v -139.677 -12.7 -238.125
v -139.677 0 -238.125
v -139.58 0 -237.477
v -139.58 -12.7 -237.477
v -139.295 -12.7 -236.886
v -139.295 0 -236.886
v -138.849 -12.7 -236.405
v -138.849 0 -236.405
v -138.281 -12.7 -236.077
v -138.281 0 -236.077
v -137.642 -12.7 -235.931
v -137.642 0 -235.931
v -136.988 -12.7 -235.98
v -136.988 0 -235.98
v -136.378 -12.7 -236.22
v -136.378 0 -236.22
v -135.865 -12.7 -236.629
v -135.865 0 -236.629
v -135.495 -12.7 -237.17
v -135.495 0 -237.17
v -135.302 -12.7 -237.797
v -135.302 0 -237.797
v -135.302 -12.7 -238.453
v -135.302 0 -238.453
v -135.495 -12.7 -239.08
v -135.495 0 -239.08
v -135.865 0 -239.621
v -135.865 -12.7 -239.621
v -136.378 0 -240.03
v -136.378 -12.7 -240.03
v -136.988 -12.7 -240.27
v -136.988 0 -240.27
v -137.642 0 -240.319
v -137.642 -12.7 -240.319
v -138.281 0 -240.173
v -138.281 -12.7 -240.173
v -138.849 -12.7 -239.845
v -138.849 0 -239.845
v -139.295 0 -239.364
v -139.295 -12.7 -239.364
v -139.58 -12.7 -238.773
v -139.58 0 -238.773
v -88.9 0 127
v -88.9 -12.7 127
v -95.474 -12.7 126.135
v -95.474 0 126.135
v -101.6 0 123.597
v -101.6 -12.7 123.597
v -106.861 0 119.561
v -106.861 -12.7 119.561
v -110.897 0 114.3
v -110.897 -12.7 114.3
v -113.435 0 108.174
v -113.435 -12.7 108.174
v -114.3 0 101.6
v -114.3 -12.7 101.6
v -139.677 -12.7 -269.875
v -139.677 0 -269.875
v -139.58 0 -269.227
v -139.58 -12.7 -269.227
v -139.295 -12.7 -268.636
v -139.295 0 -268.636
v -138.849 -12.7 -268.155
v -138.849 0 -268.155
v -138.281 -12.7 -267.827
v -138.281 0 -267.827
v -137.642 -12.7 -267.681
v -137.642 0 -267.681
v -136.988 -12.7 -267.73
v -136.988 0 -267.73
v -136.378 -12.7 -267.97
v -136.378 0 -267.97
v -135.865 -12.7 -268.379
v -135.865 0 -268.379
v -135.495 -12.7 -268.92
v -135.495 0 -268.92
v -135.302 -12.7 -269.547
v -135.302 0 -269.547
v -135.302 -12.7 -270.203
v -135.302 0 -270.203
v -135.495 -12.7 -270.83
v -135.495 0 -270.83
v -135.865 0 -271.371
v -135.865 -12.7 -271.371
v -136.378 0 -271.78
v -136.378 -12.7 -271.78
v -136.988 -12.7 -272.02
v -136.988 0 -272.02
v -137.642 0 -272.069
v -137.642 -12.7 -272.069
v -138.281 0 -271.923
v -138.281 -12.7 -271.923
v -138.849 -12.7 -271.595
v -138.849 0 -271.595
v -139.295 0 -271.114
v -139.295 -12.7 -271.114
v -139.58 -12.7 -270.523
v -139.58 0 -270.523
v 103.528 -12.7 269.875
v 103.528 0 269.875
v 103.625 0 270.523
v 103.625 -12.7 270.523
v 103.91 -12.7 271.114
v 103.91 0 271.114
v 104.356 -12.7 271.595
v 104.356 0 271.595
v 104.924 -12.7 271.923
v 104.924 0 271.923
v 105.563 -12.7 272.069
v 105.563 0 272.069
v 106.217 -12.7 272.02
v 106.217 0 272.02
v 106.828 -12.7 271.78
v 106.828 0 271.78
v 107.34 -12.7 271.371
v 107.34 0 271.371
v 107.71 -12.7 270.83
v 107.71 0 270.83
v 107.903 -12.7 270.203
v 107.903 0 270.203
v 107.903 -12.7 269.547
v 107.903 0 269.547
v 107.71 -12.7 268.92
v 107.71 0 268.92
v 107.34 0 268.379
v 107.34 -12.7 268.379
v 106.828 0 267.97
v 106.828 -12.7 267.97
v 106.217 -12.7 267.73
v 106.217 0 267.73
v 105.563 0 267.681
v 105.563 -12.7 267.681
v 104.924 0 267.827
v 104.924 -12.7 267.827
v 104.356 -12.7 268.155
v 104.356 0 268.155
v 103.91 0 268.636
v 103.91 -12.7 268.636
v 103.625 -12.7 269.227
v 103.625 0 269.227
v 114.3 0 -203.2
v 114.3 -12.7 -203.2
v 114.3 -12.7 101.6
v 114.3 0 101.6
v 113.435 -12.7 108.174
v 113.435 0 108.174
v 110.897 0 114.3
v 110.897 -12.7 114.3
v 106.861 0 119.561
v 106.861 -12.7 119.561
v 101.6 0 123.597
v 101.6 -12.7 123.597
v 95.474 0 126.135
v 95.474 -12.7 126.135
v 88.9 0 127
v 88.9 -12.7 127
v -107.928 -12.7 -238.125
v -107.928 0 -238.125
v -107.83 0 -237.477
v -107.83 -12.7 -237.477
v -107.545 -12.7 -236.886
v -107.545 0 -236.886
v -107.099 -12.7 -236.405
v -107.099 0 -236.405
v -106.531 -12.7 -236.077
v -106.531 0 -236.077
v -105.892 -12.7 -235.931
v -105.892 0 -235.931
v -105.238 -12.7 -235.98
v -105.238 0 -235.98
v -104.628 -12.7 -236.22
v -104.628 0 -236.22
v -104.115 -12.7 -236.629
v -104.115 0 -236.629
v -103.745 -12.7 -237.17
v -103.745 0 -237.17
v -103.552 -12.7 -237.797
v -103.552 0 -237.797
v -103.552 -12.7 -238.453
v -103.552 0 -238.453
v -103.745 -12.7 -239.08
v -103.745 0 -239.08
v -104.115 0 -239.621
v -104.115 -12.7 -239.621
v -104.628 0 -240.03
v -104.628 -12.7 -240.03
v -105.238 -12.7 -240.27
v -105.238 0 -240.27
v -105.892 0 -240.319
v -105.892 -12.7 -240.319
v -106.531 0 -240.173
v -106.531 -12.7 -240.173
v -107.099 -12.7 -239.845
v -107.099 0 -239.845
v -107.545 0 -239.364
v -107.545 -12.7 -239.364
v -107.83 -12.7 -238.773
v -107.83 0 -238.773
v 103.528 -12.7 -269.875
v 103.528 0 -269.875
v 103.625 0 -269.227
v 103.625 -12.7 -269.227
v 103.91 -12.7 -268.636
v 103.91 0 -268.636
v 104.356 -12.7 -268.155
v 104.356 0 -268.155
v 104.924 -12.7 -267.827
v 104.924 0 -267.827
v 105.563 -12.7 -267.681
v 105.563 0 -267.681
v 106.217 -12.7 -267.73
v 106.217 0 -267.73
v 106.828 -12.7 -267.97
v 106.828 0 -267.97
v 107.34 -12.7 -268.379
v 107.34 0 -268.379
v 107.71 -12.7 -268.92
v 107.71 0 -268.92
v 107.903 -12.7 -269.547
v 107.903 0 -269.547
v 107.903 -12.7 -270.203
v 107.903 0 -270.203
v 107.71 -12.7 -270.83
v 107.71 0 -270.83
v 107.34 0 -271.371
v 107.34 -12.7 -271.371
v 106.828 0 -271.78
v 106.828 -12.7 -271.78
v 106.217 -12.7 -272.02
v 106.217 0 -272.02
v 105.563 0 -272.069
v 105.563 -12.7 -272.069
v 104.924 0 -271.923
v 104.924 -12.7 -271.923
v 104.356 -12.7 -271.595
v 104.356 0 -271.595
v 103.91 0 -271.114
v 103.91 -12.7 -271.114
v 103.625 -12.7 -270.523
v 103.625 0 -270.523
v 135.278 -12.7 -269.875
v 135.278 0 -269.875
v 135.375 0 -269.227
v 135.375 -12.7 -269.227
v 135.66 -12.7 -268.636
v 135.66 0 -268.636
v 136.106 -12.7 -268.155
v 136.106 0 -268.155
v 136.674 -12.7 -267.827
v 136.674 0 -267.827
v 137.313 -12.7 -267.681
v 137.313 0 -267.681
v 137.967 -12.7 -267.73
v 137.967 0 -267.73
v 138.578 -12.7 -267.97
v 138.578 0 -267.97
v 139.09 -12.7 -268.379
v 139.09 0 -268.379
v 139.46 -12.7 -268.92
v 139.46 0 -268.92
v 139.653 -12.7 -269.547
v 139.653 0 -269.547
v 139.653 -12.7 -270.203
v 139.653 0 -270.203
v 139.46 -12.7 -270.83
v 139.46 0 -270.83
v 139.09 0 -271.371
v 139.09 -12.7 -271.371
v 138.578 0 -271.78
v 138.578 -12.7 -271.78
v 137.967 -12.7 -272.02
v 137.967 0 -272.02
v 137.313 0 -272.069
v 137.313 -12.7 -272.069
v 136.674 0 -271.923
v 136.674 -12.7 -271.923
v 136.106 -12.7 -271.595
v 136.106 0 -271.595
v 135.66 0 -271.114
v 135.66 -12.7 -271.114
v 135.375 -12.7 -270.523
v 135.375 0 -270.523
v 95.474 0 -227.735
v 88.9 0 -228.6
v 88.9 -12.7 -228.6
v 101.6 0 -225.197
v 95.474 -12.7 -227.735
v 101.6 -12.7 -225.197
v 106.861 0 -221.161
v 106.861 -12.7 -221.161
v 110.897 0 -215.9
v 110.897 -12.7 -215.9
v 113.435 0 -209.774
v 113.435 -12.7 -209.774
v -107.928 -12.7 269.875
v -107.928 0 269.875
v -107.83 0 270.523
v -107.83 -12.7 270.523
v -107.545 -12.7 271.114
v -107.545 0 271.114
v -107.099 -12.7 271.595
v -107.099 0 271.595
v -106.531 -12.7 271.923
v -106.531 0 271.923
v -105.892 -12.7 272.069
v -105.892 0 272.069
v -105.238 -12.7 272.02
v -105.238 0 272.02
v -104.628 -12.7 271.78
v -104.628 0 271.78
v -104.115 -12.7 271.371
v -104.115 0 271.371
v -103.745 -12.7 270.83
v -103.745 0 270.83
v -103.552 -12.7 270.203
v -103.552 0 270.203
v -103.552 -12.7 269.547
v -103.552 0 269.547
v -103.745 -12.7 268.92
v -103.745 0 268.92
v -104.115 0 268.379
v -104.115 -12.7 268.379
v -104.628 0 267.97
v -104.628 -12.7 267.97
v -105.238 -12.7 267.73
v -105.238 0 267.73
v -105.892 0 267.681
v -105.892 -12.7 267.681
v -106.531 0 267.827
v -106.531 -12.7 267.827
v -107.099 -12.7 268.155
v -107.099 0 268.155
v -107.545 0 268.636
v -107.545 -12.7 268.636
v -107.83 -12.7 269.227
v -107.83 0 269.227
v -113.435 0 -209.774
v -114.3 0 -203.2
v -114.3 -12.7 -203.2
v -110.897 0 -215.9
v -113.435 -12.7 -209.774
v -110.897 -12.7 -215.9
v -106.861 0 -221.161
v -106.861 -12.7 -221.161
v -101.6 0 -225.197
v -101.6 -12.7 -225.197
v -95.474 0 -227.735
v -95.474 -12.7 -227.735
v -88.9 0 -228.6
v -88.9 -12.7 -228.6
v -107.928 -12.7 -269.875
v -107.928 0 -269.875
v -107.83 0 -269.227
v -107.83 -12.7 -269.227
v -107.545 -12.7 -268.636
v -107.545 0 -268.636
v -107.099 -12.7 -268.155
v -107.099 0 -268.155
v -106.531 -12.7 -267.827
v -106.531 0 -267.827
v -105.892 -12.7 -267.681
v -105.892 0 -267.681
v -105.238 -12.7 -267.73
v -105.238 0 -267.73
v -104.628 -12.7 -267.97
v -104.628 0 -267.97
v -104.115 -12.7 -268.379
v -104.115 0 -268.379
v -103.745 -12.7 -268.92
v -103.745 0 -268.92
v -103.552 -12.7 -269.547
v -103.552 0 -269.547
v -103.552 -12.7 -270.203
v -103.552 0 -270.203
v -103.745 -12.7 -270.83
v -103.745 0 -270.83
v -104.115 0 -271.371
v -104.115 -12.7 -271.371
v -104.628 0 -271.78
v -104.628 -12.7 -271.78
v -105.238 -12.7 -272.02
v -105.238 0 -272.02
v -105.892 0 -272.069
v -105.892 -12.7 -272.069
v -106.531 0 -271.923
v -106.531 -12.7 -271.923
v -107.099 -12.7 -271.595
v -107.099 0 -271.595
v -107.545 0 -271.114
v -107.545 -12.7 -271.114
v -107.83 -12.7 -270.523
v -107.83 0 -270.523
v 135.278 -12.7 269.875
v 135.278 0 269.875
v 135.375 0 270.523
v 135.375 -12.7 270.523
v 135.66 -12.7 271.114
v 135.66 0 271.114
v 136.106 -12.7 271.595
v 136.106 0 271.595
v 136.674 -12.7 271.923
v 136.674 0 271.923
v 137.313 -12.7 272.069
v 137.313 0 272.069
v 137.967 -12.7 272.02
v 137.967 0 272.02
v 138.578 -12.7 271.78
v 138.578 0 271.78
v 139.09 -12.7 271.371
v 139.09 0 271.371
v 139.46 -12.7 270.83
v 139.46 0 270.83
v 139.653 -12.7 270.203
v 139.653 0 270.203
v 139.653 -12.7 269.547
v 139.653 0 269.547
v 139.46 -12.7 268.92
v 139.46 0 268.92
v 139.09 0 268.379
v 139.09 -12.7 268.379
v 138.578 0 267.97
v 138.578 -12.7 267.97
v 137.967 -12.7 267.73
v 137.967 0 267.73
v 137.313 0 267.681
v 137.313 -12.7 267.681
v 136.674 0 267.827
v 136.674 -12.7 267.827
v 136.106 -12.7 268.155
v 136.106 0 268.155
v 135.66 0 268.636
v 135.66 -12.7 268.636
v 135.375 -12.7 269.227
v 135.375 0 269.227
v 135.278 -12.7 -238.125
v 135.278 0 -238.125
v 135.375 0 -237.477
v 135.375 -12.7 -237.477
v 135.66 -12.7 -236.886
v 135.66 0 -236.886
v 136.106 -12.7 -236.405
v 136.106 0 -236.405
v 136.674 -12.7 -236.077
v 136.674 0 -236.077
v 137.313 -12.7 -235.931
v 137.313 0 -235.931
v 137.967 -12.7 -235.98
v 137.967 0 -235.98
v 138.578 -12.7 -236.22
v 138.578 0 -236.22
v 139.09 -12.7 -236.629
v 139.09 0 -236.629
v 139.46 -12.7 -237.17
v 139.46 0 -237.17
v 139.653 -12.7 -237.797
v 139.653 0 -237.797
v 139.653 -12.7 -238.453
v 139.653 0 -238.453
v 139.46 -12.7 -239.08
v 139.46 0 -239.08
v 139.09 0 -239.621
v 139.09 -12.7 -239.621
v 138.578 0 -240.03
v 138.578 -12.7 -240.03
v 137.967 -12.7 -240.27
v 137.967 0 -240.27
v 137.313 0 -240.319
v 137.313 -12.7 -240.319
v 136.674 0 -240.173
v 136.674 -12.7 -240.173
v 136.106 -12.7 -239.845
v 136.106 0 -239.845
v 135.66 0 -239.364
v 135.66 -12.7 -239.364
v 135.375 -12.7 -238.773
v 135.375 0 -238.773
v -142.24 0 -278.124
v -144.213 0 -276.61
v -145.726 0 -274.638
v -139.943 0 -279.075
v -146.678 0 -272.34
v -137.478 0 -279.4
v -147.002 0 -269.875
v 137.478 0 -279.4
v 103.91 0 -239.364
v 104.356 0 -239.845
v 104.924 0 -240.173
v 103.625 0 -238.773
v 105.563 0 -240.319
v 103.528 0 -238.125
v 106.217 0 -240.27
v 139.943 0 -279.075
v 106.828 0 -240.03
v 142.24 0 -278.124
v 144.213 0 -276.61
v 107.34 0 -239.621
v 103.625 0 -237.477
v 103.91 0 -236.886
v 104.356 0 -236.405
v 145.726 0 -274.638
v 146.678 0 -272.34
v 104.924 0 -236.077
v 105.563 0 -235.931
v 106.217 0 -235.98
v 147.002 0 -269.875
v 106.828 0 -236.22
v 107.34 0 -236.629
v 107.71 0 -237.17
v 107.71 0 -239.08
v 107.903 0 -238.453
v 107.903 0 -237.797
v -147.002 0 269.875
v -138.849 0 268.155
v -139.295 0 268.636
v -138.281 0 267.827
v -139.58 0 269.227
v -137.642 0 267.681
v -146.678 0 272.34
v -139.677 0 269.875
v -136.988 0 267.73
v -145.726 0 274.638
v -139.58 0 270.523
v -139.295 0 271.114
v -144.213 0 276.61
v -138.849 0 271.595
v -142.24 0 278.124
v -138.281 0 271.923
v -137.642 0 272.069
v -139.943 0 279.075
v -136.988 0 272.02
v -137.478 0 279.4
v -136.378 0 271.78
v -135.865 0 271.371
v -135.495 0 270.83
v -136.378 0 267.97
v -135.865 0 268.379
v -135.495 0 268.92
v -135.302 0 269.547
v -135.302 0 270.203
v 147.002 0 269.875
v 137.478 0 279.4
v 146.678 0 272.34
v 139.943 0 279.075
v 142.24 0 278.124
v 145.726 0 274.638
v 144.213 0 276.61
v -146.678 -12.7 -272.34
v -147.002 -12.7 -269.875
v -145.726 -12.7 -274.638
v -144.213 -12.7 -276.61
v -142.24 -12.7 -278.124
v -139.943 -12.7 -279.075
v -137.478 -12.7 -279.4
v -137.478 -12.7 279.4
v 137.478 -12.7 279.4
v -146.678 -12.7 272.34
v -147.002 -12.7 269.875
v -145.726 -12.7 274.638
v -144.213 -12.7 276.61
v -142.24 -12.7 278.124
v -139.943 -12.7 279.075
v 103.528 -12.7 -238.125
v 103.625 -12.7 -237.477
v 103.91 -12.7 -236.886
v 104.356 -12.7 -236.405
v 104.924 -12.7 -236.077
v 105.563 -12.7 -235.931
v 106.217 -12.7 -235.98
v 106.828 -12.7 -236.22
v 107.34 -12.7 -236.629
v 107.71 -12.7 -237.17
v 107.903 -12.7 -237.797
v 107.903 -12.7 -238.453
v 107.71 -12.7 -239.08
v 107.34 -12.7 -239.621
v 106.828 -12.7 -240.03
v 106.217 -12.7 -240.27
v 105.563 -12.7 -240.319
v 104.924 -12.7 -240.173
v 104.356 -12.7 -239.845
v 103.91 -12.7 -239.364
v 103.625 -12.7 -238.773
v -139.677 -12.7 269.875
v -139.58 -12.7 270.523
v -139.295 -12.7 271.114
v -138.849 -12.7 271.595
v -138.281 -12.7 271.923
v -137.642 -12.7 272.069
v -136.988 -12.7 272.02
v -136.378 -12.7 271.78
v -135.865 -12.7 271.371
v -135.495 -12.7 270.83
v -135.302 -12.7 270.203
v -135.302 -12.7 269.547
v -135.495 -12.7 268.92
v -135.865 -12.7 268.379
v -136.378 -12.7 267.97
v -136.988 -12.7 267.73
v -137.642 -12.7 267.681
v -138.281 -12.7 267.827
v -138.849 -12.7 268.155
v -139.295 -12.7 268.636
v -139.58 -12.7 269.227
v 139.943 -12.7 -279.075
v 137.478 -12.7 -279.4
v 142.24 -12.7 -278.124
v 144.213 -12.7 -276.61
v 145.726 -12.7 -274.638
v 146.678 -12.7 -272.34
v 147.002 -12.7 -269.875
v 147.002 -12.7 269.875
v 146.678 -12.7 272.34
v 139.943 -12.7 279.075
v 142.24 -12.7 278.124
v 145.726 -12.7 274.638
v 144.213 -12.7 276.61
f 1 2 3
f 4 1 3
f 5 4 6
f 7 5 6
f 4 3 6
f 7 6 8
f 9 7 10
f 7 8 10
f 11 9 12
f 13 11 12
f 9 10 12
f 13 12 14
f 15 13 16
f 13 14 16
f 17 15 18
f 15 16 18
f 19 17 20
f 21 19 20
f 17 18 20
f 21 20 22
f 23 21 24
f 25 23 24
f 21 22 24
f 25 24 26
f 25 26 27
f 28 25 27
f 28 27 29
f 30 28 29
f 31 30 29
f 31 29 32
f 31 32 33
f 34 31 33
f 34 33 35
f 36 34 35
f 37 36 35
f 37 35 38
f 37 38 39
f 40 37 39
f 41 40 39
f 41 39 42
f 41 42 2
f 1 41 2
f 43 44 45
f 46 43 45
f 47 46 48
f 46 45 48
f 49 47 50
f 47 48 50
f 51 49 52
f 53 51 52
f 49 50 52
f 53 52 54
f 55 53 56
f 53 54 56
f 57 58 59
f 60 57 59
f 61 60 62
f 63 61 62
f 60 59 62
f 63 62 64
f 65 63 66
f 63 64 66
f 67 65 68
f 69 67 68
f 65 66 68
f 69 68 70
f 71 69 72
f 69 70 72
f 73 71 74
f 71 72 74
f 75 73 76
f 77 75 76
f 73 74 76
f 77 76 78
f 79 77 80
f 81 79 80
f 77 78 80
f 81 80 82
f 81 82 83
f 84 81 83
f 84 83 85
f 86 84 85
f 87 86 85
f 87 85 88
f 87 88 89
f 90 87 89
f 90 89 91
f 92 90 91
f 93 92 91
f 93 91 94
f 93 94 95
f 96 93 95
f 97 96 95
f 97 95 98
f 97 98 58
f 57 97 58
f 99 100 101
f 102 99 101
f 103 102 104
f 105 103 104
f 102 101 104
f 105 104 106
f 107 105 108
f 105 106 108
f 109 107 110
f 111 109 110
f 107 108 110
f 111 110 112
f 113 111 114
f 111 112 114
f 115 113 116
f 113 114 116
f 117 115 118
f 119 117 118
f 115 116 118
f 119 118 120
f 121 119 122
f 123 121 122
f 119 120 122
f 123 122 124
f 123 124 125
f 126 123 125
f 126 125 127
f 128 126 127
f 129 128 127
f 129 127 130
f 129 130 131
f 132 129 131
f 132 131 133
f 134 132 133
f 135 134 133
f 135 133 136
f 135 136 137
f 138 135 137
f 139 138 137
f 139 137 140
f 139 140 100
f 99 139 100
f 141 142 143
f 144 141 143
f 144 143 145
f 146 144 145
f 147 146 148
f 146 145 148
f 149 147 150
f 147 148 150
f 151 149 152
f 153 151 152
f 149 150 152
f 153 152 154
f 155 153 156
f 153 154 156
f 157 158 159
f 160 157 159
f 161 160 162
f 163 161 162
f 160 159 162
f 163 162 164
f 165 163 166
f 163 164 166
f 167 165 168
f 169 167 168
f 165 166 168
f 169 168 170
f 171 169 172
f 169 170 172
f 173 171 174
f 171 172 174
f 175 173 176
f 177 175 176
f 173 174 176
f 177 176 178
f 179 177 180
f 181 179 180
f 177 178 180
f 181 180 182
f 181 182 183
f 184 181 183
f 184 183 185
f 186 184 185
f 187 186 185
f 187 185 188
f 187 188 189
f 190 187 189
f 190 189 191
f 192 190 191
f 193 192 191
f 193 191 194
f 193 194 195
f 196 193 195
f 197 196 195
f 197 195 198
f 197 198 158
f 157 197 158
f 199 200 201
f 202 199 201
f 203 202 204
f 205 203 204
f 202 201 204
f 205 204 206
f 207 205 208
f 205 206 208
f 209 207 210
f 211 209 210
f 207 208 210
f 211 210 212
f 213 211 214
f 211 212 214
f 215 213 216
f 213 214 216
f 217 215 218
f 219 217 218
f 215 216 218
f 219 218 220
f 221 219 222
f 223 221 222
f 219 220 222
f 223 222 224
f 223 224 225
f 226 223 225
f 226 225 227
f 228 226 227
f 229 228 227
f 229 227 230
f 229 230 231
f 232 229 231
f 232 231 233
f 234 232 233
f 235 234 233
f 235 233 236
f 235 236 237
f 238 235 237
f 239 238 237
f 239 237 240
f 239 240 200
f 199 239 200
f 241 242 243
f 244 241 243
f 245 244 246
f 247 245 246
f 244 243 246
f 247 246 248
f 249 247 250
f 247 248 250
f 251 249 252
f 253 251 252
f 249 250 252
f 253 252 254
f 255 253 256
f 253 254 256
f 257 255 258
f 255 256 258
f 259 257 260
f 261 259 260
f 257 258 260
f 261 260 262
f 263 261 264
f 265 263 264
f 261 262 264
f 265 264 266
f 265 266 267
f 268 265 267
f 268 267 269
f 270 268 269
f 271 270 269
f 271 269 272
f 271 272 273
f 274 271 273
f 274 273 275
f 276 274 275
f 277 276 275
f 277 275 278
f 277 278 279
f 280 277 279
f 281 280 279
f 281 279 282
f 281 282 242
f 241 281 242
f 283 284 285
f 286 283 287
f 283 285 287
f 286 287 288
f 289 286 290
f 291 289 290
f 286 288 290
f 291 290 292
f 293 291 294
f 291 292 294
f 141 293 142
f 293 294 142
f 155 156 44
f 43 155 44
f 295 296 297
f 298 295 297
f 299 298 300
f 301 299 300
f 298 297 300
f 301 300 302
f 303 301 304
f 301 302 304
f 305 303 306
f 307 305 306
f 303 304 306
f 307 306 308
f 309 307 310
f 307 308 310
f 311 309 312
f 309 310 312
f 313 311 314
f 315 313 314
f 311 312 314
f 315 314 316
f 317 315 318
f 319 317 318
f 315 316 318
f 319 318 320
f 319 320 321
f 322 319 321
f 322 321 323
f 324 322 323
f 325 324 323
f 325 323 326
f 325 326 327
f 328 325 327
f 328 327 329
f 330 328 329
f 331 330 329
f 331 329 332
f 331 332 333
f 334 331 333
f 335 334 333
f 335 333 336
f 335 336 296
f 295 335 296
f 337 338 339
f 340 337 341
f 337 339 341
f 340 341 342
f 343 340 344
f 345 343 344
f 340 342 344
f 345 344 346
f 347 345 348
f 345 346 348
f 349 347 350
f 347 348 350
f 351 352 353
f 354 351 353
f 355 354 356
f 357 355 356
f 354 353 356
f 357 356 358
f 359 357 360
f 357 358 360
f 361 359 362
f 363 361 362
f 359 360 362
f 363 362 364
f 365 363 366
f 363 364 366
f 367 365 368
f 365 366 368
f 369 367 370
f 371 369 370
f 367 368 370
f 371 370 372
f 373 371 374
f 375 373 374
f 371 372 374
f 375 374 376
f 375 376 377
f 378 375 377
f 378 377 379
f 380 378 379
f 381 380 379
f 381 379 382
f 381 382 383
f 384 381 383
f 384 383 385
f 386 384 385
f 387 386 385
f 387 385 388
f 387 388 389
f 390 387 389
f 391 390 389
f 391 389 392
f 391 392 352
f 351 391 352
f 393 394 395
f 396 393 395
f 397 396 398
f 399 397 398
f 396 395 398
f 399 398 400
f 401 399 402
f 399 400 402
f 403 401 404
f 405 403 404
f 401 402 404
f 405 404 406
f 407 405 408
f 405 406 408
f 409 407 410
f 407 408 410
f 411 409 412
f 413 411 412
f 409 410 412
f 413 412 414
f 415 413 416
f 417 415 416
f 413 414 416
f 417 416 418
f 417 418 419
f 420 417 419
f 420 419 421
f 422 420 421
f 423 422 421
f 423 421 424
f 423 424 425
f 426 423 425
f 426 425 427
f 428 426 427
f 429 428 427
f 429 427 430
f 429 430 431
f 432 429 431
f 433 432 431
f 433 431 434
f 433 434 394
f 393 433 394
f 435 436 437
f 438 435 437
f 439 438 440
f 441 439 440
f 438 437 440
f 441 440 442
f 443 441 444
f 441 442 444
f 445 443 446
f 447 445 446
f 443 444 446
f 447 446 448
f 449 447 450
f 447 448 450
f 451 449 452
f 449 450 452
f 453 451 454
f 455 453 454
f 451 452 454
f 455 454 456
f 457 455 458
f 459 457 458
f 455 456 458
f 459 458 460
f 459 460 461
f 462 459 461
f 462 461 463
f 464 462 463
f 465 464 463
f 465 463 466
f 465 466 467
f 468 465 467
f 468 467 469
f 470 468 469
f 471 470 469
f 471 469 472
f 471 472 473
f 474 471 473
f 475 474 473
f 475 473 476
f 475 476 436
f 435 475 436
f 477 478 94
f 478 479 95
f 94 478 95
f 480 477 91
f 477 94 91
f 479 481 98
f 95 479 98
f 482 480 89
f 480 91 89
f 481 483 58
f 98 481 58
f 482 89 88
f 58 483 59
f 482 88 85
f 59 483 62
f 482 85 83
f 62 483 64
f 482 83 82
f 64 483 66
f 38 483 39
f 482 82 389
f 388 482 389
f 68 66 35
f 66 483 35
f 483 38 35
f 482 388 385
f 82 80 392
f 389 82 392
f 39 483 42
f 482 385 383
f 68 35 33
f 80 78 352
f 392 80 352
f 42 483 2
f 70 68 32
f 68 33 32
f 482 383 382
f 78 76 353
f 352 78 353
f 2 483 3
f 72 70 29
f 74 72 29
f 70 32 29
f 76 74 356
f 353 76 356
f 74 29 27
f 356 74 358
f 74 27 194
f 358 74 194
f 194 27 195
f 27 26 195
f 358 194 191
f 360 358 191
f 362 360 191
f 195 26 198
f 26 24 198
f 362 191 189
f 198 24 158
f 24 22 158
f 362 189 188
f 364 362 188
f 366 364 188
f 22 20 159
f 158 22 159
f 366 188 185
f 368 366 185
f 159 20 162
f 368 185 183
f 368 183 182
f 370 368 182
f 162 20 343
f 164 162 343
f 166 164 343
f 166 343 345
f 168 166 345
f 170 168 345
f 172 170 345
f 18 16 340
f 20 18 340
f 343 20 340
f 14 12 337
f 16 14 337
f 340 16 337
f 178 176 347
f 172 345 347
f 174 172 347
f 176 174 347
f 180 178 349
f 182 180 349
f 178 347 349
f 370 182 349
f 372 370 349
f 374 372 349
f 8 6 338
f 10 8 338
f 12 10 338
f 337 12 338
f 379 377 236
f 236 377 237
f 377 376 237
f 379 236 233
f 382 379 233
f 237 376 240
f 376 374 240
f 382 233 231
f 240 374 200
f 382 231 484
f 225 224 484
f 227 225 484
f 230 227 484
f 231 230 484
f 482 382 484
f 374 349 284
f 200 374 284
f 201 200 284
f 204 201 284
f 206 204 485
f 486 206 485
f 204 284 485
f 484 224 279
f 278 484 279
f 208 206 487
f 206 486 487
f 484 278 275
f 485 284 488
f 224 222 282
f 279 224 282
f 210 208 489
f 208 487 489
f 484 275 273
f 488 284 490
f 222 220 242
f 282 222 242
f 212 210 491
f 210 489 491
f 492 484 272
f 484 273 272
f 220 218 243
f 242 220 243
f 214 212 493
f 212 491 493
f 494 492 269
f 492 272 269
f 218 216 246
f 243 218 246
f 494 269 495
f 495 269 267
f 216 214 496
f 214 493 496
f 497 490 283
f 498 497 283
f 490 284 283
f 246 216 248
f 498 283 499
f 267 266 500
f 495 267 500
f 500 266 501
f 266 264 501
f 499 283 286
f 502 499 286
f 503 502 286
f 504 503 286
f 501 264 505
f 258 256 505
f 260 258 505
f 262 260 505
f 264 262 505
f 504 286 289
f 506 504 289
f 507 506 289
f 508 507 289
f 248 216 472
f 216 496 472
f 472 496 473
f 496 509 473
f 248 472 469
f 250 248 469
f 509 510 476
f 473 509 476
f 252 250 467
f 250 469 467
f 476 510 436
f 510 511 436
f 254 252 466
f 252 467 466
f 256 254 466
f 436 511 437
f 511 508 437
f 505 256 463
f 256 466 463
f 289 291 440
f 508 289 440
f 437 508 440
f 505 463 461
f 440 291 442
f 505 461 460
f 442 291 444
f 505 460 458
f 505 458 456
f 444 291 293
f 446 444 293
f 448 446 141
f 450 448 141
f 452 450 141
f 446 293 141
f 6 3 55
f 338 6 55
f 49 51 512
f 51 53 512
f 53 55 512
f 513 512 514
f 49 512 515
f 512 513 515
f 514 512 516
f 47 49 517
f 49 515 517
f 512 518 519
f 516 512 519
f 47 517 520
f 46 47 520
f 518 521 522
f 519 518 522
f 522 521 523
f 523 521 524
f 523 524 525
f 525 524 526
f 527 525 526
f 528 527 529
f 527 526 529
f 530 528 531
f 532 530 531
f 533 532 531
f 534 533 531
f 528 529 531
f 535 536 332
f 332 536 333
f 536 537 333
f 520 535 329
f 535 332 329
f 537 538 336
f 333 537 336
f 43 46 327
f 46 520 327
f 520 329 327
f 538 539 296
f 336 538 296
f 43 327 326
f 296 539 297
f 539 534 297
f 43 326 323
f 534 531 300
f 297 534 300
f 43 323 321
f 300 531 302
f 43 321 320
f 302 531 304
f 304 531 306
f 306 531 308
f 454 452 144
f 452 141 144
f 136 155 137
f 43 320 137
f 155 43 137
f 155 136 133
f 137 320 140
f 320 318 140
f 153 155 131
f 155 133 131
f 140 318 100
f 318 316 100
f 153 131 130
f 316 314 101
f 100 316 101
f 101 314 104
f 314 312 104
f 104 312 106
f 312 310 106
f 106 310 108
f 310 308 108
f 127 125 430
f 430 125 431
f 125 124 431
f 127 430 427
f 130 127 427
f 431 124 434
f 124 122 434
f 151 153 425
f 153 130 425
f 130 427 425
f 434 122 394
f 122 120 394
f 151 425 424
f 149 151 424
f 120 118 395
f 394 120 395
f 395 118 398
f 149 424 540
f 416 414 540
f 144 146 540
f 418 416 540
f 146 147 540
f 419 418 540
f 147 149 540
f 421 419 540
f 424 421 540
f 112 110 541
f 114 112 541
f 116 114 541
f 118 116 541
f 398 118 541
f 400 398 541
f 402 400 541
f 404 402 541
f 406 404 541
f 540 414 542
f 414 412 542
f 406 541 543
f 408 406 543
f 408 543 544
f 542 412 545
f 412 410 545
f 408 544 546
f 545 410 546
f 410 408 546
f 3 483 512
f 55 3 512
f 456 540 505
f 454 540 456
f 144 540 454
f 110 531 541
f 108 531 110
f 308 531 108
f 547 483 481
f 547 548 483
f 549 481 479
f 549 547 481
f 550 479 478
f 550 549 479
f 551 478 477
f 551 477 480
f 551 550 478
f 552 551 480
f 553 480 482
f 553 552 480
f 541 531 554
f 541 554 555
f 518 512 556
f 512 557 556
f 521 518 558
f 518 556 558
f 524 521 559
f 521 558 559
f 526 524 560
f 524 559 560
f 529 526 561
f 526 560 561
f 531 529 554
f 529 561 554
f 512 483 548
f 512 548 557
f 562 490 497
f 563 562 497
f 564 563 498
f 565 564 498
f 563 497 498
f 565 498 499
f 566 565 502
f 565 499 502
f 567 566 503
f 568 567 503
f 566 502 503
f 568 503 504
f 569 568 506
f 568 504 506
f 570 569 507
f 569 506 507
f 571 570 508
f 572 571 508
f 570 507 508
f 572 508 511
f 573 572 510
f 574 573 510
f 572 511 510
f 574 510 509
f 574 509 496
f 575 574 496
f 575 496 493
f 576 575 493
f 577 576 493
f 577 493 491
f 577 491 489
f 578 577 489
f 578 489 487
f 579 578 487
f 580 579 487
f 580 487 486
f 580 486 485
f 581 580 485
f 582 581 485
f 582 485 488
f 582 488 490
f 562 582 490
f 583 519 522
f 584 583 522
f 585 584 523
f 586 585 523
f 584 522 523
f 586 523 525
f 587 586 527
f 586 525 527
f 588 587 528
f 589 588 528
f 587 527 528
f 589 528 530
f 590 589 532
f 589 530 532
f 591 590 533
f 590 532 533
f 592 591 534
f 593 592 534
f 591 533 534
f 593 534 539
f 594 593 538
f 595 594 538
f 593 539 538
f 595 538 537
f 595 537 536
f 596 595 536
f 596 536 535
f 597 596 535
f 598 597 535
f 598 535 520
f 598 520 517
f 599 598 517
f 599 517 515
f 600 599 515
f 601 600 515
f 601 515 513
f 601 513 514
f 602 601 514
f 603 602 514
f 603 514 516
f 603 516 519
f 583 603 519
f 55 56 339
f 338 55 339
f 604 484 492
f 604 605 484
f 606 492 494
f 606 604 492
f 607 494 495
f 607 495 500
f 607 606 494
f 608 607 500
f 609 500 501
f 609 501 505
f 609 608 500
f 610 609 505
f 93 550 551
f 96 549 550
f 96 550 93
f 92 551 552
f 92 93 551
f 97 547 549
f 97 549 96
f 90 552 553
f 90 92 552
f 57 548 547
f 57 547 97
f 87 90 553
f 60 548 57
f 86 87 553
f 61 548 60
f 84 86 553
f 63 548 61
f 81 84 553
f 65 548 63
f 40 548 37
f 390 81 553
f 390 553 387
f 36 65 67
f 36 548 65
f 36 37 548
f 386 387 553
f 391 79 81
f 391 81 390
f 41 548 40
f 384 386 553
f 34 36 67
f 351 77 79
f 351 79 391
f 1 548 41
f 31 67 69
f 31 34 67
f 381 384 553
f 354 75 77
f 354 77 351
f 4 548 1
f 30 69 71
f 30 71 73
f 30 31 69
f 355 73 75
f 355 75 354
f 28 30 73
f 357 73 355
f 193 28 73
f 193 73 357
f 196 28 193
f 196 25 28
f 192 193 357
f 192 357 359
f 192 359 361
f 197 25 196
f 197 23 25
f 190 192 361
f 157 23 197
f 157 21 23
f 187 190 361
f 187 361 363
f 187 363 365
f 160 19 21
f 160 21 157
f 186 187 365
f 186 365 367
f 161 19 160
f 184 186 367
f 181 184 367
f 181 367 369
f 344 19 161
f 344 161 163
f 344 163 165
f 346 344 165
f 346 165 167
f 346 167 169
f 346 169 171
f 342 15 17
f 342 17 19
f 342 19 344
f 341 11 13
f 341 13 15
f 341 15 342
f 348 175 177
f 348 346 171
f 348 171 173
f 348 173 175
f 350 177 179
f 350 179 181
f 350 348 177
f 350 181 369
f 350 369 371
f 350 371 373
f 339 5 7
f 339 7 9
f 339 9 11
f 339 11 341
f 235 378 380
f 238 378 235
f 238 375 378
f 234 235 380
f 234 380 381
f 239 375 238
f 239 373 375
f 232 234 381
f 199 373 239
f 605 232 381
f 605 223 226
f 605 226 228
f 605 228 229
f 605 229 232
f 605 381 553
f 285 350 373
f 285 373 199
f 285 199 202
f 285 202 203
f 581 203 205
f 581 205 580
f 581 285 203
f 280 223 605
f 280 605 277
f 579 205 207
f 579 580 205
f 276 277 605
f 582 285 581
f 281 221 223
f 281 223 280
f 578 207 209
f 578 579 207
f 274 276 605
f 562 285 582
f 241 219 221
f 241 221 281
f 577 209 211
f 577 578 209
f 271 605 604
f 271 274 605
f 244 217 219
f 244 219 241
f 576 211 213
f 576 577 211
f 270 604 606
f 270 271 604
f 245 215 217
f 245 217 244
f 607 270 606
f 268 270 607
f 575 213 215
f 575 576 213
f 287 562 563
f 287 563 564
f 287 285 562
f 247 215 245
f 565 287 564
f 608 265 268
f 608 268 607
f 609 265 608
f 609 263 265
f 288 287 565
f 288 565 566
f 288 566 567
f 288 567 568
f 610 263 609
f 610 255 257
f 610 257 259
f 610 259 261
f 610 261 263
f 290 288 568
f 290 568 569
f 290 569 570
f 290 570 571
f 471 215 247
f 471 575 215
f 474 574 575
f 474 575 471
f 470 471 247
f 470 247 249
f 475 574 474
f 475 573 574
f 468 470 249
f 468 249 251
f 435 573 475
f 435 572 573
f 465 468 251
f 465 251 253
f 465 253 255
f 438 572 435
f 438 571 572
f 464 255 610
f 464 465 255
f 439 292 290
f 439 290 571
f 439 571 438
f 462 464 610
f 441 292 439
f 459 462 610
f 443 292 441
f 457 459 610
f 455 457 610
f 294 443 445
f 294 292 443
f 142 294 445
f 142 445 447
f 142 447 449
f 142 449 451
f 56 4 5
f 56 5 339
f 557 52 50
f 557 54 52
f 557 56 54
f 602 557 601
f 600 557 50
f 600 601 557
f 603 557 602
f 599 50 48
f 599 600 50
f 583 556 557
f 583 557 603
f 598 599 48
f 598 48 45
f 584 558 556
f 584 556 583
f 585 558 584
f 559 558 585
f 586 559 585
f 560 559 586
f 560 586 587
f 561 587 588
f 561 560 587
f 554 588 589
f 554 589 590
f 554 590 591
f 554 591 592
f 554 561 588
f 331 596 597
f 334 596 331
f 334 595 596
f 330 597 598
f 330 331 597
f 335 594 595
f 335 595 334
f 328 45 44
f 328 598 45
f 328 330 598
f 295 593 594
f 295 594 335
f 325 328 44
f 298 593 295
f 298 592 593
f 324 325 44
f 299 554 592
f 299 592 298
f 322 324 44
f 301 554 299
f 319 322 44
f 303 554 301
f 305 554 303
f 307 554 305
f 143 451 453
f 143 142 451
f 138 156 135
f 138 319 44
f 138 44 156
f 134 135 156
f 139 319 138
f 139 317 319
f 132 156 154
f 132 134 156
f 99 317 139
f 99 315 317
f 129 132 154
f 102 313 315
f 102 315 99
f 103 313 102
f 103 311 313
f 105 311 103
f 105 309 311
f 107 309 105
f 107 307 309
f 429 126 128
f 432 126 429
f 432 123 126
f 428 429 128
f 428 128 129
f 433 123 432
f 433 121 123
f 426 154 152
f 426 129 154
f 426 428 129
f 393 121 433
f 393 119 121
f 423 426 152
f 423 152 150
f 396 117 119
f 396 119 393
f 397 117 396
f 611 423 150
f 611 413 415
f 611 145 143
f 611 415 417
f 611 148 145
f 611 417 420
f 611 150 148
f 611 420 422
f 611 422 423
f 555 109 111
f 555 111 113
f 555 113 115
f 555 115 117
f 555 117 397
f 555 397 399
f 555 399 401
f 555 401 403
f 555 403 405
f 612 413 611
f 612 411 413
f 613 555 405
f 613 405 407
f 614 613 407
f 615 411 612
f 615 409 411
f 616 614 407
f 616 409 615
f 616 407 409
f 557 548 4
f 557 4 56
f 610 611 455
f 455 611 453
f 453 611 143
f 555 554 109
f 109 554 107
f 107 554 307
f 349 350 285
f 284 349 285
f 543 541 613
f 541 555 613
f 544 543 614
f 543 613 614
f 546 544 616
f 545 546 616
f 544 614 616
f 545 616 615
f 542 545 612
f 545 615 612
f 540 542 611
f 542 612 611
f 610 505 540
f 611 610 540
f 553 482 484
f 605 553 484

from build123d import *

# Parameters (mm, degrees)
F0_W     = 294.005
F0_H     = 558.8
F1_DEPTH = 12.7
F3_D     = 4.4
F4_R     = 9.525
F6_DEPTH = 12.701


with BuildPart() as f1:
    # F0 (on Front) → F1 (new body)
    with BuildSketch(Plane.XZ):
        Rectangle(F0_W, F0_H)
    extrude(amount=F1_DEPTH)

    # F3 (through all)
    with Locations(Plane.XZ.offset(12.7)):
        with Locations((-137.4775, 269.875), (-105.7275, 269.875), (105.7275, 269.875), (137.4775, 269.875), (105.7275, -238.125), (137.4775, -238.125), (137.4775, -269.875), (105.7275, -269.875), (-105.7275, -269.875), (-137.4775, -269.875), (-137.4775, -238.125), (-105.7275, -238.125)):
            Hole(F3_D / 2)

    # F4
    f4_edges = [f1.edges().sort_by_distance(p)[0] for p in [
        (147.0025, -6.35, 279.4),
        (147.0025, -6.35, -279.4),
        (-147.0025, -6.35, -279.4),
        (-147.0025, -6.35, 279.4),
    ]]
    fillet(f4_edges, radius=F4_R)

    # F5 (on face) → F6 (cut, through all)
    with BuildSketch(Plane.XZ.offset(12.7)):
        with BuildLine():
            Line((88.9, 127), (-88.9, 127))
            ThreePointArc((-88.9, 127), (-106.8605122421, 119.5605122421), (-114.3, 101.6))
            Line((-114.3, 101.6), (-114.3, -203.2))
            ThreePointArc((-114.3, -203.2), (-106.8605122421, -221.1605122421), (-88.9, -228.6))
            Line((-88.9, -228.6), (88.9, -228.6))
            ThreePointArc((88.9, -228.6), (106.8605122421, -221.1605122421), (114.3, -203.2))
            Line((114.3, -203.2), (114.3, 101.6))
            ThreePointArc((114.3, 101.6), (106.8605122421, 119.5605122421), (88.9, 127))
        make_face()
    extrude(amount=-F6_DEPTH, mode=Mode.SUBTRACT)


solid = f1.part
